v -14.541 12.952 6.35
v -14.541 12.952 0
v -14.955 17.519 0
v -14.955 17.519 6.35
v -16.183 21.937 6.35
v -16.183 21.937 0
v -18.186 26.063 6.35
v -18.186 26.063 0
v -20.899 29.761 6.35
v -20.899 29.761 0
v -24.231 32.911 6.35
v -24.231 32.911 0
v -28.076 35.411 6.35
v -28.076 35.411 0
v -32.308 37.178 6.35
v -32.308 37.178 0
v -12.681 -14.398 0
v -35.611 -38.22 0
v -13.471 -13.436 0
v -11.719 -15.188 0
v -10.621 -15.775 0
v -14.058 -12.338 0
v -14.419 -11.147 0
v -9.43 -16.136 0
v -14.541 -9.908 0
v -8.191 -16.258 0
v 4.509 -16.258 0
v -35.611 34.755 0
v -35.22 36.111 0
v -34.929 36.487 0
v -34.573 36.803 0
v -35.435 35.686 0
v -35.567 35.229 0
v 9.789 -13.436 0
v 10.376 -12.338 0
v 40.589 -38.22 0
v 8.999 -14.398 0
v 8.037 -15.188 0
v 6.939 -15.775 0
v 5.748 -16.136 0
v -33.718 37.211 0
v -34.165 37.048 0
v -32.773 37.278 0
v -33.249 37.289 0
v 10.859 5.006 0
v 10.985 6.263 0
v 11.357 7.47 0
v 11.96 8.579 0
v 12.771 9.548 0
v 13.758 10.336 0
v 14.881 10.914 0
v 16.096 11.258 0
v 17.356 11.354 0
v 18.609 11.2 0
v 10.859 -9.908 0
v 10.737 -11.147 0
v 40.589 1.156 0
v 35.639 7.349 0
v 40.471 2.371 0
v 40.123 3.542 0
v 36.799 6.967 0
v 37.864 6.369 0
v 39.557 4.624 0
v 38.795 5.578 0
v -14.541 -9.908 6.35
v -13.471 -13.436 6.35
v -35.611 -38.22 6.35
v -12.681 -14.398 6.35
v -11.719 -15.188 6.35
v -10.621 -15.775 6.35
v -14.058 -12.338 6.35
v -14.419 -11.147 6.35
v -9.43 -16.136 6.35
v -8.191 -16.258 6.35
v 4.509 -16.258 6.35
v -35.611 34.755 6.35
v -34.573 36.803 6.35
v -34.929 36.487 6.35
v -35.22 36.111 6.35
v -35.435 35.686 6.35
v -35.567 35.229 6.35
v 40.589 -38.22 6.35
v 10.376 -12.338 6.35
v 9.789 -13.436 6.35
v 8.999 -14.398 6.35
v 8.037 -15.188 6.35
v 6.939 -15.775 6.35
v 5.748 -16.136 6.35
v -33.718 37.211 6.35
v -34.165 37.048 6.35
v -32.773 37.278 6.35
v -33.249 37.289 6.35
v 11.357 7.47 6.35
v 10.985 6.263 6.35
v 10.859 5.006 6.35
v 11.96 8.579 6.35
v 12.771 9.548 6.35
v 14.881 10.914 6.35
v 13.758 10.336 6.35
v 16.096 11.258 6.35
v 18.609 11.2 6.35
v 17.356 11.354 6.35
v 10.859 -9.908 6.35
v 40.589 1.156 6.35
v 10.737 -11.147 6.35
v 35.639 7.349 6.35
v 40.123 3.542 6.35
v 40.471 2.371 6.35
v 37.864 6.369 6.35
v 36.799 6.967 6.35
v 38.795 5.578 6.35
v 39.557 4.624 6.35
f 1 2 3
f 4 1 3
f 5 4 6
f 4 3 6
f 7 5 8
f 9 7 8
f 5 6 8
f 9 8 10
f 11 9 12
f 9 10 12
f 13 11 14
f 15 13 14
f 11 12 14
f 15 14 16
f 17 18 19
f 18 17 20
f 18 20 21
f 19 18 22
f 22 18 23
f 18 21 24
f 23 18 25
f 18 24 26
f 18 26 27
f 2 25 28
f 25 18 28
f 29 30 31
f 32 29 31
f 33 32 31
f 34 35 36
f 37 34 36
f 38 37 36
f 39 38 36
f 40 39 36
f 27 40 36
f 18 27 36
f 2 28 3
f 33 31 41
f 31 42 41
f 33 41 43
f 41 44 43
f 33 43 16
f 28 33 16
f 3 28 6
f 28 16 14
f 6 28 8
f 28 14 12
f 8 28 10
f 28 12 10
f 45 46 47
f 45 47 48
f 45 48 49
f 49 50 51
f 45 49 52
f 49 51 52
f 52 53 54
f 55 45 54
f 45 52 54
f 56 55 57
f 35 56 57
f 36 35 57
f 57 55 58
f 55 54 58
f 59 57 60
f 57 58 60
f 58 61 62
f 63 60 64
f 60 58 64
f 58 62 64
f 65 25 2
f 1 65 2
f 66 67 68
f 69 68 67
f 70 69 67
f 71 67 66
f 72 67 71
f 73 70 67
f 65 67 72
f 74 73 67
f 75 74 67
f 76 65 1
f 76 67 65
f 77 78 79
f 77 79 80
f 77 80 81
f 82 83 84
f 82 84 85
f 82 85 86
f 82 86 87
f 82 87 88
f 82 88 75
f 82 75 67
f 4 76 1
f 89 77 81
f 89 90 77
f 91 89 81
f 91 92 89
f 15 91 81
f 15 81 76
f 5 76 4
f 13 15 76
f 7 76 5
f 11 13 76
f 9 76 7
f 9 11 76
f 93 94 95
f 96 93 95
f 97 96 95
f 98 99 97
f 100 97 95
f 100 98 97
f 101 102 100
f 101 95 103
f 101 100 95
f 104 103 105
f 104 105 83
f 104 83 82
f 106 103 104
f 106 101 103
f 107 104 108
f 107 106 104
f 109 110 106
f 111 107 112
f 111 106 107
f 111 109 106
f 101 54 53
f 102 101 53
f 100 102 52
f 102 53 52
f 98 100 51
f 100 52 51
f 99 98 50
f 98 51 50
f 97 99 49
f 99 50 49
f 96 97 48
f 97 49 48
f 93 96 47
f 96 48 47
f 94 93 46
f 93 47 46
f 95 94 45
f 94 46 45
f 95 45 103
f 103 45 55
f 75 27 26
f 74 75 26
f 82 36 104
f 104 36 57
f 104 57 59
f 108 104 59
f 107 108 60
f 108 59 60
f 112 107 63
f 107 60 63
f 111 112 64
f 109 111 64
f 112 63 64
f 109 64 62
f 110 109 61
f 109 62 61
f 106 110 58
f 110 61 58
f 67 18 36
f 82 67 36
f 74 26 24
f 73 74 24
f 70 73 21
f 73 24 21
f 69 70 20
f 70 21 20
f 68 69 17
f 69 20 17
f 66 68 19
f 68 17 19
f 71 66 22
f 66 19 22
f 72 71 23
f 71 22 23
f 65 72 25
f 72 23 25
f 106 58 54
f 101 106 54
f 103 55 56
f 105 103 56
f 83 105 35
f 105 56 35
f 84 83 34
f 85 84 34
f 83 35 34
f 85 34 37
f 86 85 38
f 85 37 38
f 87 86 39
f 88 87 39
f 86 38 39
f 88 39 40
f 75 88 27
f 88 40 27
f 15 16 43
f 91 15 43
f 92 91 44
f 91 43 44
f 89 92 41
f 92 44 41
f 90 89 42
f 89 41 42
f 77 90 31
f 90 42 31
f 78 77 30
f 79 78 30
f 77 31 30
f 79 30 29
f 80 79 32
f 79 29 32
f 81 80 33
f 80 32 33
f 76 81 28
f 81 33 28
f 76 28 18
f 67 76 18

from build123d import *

# Parameters (mm, degrees)
F1_DEPTH = 6.35


with BuildPart() as f1:
    # F0 (on Top) → F1 (new body)
    with BuildSketch(Plane.XY):
        with BuildLine():
            Line((-35.611351, -38.21987), (40.588649, -38.21987))
            Line((40.588649, -38.21987), (40.588649, 1.155555))
            ThreePointArc((40.588649, 1.155555), (39.199232, 5.119784), (35.639008, 7.349221))
            Line((35.639008, 7.349221), (18.609413, 11.199534))
            ThreePointArc((18.609413, 11.199534), (13.244825, 9.966452), (10.859053, 5.005868))
            Line((10.859053, 5.005868), (10.859053, -9.908146))
            ThreePointArc((10.859053, -9.908146), (8.999181, -14.398274), (4.509053, -16.258146))
            Line((4.509053, -16.258146), (-8.190947, -16.258146))
            ThreePointArc((-8.190947, -16.258146), (-12.681075, -14.398274), (-14.540947, -9.908146))
            Line((-14.540947, -9.908146), (-14.540947, 12.951854))
            ThreePointArc((-14.540947, 12.951854), (-19.458817, 27.973251), (-32.308063, 37.177854))
            ThreePointArc((-32.308063, 37.177854), (-34.573491, 36.803467), (-35.611351, 34.755254))
            Line((-35.611351, 34.755254), (-35.611351, -38.21987))
        make_face()
    extrude(amount=F1_DEPTH)


solid = f1.part
